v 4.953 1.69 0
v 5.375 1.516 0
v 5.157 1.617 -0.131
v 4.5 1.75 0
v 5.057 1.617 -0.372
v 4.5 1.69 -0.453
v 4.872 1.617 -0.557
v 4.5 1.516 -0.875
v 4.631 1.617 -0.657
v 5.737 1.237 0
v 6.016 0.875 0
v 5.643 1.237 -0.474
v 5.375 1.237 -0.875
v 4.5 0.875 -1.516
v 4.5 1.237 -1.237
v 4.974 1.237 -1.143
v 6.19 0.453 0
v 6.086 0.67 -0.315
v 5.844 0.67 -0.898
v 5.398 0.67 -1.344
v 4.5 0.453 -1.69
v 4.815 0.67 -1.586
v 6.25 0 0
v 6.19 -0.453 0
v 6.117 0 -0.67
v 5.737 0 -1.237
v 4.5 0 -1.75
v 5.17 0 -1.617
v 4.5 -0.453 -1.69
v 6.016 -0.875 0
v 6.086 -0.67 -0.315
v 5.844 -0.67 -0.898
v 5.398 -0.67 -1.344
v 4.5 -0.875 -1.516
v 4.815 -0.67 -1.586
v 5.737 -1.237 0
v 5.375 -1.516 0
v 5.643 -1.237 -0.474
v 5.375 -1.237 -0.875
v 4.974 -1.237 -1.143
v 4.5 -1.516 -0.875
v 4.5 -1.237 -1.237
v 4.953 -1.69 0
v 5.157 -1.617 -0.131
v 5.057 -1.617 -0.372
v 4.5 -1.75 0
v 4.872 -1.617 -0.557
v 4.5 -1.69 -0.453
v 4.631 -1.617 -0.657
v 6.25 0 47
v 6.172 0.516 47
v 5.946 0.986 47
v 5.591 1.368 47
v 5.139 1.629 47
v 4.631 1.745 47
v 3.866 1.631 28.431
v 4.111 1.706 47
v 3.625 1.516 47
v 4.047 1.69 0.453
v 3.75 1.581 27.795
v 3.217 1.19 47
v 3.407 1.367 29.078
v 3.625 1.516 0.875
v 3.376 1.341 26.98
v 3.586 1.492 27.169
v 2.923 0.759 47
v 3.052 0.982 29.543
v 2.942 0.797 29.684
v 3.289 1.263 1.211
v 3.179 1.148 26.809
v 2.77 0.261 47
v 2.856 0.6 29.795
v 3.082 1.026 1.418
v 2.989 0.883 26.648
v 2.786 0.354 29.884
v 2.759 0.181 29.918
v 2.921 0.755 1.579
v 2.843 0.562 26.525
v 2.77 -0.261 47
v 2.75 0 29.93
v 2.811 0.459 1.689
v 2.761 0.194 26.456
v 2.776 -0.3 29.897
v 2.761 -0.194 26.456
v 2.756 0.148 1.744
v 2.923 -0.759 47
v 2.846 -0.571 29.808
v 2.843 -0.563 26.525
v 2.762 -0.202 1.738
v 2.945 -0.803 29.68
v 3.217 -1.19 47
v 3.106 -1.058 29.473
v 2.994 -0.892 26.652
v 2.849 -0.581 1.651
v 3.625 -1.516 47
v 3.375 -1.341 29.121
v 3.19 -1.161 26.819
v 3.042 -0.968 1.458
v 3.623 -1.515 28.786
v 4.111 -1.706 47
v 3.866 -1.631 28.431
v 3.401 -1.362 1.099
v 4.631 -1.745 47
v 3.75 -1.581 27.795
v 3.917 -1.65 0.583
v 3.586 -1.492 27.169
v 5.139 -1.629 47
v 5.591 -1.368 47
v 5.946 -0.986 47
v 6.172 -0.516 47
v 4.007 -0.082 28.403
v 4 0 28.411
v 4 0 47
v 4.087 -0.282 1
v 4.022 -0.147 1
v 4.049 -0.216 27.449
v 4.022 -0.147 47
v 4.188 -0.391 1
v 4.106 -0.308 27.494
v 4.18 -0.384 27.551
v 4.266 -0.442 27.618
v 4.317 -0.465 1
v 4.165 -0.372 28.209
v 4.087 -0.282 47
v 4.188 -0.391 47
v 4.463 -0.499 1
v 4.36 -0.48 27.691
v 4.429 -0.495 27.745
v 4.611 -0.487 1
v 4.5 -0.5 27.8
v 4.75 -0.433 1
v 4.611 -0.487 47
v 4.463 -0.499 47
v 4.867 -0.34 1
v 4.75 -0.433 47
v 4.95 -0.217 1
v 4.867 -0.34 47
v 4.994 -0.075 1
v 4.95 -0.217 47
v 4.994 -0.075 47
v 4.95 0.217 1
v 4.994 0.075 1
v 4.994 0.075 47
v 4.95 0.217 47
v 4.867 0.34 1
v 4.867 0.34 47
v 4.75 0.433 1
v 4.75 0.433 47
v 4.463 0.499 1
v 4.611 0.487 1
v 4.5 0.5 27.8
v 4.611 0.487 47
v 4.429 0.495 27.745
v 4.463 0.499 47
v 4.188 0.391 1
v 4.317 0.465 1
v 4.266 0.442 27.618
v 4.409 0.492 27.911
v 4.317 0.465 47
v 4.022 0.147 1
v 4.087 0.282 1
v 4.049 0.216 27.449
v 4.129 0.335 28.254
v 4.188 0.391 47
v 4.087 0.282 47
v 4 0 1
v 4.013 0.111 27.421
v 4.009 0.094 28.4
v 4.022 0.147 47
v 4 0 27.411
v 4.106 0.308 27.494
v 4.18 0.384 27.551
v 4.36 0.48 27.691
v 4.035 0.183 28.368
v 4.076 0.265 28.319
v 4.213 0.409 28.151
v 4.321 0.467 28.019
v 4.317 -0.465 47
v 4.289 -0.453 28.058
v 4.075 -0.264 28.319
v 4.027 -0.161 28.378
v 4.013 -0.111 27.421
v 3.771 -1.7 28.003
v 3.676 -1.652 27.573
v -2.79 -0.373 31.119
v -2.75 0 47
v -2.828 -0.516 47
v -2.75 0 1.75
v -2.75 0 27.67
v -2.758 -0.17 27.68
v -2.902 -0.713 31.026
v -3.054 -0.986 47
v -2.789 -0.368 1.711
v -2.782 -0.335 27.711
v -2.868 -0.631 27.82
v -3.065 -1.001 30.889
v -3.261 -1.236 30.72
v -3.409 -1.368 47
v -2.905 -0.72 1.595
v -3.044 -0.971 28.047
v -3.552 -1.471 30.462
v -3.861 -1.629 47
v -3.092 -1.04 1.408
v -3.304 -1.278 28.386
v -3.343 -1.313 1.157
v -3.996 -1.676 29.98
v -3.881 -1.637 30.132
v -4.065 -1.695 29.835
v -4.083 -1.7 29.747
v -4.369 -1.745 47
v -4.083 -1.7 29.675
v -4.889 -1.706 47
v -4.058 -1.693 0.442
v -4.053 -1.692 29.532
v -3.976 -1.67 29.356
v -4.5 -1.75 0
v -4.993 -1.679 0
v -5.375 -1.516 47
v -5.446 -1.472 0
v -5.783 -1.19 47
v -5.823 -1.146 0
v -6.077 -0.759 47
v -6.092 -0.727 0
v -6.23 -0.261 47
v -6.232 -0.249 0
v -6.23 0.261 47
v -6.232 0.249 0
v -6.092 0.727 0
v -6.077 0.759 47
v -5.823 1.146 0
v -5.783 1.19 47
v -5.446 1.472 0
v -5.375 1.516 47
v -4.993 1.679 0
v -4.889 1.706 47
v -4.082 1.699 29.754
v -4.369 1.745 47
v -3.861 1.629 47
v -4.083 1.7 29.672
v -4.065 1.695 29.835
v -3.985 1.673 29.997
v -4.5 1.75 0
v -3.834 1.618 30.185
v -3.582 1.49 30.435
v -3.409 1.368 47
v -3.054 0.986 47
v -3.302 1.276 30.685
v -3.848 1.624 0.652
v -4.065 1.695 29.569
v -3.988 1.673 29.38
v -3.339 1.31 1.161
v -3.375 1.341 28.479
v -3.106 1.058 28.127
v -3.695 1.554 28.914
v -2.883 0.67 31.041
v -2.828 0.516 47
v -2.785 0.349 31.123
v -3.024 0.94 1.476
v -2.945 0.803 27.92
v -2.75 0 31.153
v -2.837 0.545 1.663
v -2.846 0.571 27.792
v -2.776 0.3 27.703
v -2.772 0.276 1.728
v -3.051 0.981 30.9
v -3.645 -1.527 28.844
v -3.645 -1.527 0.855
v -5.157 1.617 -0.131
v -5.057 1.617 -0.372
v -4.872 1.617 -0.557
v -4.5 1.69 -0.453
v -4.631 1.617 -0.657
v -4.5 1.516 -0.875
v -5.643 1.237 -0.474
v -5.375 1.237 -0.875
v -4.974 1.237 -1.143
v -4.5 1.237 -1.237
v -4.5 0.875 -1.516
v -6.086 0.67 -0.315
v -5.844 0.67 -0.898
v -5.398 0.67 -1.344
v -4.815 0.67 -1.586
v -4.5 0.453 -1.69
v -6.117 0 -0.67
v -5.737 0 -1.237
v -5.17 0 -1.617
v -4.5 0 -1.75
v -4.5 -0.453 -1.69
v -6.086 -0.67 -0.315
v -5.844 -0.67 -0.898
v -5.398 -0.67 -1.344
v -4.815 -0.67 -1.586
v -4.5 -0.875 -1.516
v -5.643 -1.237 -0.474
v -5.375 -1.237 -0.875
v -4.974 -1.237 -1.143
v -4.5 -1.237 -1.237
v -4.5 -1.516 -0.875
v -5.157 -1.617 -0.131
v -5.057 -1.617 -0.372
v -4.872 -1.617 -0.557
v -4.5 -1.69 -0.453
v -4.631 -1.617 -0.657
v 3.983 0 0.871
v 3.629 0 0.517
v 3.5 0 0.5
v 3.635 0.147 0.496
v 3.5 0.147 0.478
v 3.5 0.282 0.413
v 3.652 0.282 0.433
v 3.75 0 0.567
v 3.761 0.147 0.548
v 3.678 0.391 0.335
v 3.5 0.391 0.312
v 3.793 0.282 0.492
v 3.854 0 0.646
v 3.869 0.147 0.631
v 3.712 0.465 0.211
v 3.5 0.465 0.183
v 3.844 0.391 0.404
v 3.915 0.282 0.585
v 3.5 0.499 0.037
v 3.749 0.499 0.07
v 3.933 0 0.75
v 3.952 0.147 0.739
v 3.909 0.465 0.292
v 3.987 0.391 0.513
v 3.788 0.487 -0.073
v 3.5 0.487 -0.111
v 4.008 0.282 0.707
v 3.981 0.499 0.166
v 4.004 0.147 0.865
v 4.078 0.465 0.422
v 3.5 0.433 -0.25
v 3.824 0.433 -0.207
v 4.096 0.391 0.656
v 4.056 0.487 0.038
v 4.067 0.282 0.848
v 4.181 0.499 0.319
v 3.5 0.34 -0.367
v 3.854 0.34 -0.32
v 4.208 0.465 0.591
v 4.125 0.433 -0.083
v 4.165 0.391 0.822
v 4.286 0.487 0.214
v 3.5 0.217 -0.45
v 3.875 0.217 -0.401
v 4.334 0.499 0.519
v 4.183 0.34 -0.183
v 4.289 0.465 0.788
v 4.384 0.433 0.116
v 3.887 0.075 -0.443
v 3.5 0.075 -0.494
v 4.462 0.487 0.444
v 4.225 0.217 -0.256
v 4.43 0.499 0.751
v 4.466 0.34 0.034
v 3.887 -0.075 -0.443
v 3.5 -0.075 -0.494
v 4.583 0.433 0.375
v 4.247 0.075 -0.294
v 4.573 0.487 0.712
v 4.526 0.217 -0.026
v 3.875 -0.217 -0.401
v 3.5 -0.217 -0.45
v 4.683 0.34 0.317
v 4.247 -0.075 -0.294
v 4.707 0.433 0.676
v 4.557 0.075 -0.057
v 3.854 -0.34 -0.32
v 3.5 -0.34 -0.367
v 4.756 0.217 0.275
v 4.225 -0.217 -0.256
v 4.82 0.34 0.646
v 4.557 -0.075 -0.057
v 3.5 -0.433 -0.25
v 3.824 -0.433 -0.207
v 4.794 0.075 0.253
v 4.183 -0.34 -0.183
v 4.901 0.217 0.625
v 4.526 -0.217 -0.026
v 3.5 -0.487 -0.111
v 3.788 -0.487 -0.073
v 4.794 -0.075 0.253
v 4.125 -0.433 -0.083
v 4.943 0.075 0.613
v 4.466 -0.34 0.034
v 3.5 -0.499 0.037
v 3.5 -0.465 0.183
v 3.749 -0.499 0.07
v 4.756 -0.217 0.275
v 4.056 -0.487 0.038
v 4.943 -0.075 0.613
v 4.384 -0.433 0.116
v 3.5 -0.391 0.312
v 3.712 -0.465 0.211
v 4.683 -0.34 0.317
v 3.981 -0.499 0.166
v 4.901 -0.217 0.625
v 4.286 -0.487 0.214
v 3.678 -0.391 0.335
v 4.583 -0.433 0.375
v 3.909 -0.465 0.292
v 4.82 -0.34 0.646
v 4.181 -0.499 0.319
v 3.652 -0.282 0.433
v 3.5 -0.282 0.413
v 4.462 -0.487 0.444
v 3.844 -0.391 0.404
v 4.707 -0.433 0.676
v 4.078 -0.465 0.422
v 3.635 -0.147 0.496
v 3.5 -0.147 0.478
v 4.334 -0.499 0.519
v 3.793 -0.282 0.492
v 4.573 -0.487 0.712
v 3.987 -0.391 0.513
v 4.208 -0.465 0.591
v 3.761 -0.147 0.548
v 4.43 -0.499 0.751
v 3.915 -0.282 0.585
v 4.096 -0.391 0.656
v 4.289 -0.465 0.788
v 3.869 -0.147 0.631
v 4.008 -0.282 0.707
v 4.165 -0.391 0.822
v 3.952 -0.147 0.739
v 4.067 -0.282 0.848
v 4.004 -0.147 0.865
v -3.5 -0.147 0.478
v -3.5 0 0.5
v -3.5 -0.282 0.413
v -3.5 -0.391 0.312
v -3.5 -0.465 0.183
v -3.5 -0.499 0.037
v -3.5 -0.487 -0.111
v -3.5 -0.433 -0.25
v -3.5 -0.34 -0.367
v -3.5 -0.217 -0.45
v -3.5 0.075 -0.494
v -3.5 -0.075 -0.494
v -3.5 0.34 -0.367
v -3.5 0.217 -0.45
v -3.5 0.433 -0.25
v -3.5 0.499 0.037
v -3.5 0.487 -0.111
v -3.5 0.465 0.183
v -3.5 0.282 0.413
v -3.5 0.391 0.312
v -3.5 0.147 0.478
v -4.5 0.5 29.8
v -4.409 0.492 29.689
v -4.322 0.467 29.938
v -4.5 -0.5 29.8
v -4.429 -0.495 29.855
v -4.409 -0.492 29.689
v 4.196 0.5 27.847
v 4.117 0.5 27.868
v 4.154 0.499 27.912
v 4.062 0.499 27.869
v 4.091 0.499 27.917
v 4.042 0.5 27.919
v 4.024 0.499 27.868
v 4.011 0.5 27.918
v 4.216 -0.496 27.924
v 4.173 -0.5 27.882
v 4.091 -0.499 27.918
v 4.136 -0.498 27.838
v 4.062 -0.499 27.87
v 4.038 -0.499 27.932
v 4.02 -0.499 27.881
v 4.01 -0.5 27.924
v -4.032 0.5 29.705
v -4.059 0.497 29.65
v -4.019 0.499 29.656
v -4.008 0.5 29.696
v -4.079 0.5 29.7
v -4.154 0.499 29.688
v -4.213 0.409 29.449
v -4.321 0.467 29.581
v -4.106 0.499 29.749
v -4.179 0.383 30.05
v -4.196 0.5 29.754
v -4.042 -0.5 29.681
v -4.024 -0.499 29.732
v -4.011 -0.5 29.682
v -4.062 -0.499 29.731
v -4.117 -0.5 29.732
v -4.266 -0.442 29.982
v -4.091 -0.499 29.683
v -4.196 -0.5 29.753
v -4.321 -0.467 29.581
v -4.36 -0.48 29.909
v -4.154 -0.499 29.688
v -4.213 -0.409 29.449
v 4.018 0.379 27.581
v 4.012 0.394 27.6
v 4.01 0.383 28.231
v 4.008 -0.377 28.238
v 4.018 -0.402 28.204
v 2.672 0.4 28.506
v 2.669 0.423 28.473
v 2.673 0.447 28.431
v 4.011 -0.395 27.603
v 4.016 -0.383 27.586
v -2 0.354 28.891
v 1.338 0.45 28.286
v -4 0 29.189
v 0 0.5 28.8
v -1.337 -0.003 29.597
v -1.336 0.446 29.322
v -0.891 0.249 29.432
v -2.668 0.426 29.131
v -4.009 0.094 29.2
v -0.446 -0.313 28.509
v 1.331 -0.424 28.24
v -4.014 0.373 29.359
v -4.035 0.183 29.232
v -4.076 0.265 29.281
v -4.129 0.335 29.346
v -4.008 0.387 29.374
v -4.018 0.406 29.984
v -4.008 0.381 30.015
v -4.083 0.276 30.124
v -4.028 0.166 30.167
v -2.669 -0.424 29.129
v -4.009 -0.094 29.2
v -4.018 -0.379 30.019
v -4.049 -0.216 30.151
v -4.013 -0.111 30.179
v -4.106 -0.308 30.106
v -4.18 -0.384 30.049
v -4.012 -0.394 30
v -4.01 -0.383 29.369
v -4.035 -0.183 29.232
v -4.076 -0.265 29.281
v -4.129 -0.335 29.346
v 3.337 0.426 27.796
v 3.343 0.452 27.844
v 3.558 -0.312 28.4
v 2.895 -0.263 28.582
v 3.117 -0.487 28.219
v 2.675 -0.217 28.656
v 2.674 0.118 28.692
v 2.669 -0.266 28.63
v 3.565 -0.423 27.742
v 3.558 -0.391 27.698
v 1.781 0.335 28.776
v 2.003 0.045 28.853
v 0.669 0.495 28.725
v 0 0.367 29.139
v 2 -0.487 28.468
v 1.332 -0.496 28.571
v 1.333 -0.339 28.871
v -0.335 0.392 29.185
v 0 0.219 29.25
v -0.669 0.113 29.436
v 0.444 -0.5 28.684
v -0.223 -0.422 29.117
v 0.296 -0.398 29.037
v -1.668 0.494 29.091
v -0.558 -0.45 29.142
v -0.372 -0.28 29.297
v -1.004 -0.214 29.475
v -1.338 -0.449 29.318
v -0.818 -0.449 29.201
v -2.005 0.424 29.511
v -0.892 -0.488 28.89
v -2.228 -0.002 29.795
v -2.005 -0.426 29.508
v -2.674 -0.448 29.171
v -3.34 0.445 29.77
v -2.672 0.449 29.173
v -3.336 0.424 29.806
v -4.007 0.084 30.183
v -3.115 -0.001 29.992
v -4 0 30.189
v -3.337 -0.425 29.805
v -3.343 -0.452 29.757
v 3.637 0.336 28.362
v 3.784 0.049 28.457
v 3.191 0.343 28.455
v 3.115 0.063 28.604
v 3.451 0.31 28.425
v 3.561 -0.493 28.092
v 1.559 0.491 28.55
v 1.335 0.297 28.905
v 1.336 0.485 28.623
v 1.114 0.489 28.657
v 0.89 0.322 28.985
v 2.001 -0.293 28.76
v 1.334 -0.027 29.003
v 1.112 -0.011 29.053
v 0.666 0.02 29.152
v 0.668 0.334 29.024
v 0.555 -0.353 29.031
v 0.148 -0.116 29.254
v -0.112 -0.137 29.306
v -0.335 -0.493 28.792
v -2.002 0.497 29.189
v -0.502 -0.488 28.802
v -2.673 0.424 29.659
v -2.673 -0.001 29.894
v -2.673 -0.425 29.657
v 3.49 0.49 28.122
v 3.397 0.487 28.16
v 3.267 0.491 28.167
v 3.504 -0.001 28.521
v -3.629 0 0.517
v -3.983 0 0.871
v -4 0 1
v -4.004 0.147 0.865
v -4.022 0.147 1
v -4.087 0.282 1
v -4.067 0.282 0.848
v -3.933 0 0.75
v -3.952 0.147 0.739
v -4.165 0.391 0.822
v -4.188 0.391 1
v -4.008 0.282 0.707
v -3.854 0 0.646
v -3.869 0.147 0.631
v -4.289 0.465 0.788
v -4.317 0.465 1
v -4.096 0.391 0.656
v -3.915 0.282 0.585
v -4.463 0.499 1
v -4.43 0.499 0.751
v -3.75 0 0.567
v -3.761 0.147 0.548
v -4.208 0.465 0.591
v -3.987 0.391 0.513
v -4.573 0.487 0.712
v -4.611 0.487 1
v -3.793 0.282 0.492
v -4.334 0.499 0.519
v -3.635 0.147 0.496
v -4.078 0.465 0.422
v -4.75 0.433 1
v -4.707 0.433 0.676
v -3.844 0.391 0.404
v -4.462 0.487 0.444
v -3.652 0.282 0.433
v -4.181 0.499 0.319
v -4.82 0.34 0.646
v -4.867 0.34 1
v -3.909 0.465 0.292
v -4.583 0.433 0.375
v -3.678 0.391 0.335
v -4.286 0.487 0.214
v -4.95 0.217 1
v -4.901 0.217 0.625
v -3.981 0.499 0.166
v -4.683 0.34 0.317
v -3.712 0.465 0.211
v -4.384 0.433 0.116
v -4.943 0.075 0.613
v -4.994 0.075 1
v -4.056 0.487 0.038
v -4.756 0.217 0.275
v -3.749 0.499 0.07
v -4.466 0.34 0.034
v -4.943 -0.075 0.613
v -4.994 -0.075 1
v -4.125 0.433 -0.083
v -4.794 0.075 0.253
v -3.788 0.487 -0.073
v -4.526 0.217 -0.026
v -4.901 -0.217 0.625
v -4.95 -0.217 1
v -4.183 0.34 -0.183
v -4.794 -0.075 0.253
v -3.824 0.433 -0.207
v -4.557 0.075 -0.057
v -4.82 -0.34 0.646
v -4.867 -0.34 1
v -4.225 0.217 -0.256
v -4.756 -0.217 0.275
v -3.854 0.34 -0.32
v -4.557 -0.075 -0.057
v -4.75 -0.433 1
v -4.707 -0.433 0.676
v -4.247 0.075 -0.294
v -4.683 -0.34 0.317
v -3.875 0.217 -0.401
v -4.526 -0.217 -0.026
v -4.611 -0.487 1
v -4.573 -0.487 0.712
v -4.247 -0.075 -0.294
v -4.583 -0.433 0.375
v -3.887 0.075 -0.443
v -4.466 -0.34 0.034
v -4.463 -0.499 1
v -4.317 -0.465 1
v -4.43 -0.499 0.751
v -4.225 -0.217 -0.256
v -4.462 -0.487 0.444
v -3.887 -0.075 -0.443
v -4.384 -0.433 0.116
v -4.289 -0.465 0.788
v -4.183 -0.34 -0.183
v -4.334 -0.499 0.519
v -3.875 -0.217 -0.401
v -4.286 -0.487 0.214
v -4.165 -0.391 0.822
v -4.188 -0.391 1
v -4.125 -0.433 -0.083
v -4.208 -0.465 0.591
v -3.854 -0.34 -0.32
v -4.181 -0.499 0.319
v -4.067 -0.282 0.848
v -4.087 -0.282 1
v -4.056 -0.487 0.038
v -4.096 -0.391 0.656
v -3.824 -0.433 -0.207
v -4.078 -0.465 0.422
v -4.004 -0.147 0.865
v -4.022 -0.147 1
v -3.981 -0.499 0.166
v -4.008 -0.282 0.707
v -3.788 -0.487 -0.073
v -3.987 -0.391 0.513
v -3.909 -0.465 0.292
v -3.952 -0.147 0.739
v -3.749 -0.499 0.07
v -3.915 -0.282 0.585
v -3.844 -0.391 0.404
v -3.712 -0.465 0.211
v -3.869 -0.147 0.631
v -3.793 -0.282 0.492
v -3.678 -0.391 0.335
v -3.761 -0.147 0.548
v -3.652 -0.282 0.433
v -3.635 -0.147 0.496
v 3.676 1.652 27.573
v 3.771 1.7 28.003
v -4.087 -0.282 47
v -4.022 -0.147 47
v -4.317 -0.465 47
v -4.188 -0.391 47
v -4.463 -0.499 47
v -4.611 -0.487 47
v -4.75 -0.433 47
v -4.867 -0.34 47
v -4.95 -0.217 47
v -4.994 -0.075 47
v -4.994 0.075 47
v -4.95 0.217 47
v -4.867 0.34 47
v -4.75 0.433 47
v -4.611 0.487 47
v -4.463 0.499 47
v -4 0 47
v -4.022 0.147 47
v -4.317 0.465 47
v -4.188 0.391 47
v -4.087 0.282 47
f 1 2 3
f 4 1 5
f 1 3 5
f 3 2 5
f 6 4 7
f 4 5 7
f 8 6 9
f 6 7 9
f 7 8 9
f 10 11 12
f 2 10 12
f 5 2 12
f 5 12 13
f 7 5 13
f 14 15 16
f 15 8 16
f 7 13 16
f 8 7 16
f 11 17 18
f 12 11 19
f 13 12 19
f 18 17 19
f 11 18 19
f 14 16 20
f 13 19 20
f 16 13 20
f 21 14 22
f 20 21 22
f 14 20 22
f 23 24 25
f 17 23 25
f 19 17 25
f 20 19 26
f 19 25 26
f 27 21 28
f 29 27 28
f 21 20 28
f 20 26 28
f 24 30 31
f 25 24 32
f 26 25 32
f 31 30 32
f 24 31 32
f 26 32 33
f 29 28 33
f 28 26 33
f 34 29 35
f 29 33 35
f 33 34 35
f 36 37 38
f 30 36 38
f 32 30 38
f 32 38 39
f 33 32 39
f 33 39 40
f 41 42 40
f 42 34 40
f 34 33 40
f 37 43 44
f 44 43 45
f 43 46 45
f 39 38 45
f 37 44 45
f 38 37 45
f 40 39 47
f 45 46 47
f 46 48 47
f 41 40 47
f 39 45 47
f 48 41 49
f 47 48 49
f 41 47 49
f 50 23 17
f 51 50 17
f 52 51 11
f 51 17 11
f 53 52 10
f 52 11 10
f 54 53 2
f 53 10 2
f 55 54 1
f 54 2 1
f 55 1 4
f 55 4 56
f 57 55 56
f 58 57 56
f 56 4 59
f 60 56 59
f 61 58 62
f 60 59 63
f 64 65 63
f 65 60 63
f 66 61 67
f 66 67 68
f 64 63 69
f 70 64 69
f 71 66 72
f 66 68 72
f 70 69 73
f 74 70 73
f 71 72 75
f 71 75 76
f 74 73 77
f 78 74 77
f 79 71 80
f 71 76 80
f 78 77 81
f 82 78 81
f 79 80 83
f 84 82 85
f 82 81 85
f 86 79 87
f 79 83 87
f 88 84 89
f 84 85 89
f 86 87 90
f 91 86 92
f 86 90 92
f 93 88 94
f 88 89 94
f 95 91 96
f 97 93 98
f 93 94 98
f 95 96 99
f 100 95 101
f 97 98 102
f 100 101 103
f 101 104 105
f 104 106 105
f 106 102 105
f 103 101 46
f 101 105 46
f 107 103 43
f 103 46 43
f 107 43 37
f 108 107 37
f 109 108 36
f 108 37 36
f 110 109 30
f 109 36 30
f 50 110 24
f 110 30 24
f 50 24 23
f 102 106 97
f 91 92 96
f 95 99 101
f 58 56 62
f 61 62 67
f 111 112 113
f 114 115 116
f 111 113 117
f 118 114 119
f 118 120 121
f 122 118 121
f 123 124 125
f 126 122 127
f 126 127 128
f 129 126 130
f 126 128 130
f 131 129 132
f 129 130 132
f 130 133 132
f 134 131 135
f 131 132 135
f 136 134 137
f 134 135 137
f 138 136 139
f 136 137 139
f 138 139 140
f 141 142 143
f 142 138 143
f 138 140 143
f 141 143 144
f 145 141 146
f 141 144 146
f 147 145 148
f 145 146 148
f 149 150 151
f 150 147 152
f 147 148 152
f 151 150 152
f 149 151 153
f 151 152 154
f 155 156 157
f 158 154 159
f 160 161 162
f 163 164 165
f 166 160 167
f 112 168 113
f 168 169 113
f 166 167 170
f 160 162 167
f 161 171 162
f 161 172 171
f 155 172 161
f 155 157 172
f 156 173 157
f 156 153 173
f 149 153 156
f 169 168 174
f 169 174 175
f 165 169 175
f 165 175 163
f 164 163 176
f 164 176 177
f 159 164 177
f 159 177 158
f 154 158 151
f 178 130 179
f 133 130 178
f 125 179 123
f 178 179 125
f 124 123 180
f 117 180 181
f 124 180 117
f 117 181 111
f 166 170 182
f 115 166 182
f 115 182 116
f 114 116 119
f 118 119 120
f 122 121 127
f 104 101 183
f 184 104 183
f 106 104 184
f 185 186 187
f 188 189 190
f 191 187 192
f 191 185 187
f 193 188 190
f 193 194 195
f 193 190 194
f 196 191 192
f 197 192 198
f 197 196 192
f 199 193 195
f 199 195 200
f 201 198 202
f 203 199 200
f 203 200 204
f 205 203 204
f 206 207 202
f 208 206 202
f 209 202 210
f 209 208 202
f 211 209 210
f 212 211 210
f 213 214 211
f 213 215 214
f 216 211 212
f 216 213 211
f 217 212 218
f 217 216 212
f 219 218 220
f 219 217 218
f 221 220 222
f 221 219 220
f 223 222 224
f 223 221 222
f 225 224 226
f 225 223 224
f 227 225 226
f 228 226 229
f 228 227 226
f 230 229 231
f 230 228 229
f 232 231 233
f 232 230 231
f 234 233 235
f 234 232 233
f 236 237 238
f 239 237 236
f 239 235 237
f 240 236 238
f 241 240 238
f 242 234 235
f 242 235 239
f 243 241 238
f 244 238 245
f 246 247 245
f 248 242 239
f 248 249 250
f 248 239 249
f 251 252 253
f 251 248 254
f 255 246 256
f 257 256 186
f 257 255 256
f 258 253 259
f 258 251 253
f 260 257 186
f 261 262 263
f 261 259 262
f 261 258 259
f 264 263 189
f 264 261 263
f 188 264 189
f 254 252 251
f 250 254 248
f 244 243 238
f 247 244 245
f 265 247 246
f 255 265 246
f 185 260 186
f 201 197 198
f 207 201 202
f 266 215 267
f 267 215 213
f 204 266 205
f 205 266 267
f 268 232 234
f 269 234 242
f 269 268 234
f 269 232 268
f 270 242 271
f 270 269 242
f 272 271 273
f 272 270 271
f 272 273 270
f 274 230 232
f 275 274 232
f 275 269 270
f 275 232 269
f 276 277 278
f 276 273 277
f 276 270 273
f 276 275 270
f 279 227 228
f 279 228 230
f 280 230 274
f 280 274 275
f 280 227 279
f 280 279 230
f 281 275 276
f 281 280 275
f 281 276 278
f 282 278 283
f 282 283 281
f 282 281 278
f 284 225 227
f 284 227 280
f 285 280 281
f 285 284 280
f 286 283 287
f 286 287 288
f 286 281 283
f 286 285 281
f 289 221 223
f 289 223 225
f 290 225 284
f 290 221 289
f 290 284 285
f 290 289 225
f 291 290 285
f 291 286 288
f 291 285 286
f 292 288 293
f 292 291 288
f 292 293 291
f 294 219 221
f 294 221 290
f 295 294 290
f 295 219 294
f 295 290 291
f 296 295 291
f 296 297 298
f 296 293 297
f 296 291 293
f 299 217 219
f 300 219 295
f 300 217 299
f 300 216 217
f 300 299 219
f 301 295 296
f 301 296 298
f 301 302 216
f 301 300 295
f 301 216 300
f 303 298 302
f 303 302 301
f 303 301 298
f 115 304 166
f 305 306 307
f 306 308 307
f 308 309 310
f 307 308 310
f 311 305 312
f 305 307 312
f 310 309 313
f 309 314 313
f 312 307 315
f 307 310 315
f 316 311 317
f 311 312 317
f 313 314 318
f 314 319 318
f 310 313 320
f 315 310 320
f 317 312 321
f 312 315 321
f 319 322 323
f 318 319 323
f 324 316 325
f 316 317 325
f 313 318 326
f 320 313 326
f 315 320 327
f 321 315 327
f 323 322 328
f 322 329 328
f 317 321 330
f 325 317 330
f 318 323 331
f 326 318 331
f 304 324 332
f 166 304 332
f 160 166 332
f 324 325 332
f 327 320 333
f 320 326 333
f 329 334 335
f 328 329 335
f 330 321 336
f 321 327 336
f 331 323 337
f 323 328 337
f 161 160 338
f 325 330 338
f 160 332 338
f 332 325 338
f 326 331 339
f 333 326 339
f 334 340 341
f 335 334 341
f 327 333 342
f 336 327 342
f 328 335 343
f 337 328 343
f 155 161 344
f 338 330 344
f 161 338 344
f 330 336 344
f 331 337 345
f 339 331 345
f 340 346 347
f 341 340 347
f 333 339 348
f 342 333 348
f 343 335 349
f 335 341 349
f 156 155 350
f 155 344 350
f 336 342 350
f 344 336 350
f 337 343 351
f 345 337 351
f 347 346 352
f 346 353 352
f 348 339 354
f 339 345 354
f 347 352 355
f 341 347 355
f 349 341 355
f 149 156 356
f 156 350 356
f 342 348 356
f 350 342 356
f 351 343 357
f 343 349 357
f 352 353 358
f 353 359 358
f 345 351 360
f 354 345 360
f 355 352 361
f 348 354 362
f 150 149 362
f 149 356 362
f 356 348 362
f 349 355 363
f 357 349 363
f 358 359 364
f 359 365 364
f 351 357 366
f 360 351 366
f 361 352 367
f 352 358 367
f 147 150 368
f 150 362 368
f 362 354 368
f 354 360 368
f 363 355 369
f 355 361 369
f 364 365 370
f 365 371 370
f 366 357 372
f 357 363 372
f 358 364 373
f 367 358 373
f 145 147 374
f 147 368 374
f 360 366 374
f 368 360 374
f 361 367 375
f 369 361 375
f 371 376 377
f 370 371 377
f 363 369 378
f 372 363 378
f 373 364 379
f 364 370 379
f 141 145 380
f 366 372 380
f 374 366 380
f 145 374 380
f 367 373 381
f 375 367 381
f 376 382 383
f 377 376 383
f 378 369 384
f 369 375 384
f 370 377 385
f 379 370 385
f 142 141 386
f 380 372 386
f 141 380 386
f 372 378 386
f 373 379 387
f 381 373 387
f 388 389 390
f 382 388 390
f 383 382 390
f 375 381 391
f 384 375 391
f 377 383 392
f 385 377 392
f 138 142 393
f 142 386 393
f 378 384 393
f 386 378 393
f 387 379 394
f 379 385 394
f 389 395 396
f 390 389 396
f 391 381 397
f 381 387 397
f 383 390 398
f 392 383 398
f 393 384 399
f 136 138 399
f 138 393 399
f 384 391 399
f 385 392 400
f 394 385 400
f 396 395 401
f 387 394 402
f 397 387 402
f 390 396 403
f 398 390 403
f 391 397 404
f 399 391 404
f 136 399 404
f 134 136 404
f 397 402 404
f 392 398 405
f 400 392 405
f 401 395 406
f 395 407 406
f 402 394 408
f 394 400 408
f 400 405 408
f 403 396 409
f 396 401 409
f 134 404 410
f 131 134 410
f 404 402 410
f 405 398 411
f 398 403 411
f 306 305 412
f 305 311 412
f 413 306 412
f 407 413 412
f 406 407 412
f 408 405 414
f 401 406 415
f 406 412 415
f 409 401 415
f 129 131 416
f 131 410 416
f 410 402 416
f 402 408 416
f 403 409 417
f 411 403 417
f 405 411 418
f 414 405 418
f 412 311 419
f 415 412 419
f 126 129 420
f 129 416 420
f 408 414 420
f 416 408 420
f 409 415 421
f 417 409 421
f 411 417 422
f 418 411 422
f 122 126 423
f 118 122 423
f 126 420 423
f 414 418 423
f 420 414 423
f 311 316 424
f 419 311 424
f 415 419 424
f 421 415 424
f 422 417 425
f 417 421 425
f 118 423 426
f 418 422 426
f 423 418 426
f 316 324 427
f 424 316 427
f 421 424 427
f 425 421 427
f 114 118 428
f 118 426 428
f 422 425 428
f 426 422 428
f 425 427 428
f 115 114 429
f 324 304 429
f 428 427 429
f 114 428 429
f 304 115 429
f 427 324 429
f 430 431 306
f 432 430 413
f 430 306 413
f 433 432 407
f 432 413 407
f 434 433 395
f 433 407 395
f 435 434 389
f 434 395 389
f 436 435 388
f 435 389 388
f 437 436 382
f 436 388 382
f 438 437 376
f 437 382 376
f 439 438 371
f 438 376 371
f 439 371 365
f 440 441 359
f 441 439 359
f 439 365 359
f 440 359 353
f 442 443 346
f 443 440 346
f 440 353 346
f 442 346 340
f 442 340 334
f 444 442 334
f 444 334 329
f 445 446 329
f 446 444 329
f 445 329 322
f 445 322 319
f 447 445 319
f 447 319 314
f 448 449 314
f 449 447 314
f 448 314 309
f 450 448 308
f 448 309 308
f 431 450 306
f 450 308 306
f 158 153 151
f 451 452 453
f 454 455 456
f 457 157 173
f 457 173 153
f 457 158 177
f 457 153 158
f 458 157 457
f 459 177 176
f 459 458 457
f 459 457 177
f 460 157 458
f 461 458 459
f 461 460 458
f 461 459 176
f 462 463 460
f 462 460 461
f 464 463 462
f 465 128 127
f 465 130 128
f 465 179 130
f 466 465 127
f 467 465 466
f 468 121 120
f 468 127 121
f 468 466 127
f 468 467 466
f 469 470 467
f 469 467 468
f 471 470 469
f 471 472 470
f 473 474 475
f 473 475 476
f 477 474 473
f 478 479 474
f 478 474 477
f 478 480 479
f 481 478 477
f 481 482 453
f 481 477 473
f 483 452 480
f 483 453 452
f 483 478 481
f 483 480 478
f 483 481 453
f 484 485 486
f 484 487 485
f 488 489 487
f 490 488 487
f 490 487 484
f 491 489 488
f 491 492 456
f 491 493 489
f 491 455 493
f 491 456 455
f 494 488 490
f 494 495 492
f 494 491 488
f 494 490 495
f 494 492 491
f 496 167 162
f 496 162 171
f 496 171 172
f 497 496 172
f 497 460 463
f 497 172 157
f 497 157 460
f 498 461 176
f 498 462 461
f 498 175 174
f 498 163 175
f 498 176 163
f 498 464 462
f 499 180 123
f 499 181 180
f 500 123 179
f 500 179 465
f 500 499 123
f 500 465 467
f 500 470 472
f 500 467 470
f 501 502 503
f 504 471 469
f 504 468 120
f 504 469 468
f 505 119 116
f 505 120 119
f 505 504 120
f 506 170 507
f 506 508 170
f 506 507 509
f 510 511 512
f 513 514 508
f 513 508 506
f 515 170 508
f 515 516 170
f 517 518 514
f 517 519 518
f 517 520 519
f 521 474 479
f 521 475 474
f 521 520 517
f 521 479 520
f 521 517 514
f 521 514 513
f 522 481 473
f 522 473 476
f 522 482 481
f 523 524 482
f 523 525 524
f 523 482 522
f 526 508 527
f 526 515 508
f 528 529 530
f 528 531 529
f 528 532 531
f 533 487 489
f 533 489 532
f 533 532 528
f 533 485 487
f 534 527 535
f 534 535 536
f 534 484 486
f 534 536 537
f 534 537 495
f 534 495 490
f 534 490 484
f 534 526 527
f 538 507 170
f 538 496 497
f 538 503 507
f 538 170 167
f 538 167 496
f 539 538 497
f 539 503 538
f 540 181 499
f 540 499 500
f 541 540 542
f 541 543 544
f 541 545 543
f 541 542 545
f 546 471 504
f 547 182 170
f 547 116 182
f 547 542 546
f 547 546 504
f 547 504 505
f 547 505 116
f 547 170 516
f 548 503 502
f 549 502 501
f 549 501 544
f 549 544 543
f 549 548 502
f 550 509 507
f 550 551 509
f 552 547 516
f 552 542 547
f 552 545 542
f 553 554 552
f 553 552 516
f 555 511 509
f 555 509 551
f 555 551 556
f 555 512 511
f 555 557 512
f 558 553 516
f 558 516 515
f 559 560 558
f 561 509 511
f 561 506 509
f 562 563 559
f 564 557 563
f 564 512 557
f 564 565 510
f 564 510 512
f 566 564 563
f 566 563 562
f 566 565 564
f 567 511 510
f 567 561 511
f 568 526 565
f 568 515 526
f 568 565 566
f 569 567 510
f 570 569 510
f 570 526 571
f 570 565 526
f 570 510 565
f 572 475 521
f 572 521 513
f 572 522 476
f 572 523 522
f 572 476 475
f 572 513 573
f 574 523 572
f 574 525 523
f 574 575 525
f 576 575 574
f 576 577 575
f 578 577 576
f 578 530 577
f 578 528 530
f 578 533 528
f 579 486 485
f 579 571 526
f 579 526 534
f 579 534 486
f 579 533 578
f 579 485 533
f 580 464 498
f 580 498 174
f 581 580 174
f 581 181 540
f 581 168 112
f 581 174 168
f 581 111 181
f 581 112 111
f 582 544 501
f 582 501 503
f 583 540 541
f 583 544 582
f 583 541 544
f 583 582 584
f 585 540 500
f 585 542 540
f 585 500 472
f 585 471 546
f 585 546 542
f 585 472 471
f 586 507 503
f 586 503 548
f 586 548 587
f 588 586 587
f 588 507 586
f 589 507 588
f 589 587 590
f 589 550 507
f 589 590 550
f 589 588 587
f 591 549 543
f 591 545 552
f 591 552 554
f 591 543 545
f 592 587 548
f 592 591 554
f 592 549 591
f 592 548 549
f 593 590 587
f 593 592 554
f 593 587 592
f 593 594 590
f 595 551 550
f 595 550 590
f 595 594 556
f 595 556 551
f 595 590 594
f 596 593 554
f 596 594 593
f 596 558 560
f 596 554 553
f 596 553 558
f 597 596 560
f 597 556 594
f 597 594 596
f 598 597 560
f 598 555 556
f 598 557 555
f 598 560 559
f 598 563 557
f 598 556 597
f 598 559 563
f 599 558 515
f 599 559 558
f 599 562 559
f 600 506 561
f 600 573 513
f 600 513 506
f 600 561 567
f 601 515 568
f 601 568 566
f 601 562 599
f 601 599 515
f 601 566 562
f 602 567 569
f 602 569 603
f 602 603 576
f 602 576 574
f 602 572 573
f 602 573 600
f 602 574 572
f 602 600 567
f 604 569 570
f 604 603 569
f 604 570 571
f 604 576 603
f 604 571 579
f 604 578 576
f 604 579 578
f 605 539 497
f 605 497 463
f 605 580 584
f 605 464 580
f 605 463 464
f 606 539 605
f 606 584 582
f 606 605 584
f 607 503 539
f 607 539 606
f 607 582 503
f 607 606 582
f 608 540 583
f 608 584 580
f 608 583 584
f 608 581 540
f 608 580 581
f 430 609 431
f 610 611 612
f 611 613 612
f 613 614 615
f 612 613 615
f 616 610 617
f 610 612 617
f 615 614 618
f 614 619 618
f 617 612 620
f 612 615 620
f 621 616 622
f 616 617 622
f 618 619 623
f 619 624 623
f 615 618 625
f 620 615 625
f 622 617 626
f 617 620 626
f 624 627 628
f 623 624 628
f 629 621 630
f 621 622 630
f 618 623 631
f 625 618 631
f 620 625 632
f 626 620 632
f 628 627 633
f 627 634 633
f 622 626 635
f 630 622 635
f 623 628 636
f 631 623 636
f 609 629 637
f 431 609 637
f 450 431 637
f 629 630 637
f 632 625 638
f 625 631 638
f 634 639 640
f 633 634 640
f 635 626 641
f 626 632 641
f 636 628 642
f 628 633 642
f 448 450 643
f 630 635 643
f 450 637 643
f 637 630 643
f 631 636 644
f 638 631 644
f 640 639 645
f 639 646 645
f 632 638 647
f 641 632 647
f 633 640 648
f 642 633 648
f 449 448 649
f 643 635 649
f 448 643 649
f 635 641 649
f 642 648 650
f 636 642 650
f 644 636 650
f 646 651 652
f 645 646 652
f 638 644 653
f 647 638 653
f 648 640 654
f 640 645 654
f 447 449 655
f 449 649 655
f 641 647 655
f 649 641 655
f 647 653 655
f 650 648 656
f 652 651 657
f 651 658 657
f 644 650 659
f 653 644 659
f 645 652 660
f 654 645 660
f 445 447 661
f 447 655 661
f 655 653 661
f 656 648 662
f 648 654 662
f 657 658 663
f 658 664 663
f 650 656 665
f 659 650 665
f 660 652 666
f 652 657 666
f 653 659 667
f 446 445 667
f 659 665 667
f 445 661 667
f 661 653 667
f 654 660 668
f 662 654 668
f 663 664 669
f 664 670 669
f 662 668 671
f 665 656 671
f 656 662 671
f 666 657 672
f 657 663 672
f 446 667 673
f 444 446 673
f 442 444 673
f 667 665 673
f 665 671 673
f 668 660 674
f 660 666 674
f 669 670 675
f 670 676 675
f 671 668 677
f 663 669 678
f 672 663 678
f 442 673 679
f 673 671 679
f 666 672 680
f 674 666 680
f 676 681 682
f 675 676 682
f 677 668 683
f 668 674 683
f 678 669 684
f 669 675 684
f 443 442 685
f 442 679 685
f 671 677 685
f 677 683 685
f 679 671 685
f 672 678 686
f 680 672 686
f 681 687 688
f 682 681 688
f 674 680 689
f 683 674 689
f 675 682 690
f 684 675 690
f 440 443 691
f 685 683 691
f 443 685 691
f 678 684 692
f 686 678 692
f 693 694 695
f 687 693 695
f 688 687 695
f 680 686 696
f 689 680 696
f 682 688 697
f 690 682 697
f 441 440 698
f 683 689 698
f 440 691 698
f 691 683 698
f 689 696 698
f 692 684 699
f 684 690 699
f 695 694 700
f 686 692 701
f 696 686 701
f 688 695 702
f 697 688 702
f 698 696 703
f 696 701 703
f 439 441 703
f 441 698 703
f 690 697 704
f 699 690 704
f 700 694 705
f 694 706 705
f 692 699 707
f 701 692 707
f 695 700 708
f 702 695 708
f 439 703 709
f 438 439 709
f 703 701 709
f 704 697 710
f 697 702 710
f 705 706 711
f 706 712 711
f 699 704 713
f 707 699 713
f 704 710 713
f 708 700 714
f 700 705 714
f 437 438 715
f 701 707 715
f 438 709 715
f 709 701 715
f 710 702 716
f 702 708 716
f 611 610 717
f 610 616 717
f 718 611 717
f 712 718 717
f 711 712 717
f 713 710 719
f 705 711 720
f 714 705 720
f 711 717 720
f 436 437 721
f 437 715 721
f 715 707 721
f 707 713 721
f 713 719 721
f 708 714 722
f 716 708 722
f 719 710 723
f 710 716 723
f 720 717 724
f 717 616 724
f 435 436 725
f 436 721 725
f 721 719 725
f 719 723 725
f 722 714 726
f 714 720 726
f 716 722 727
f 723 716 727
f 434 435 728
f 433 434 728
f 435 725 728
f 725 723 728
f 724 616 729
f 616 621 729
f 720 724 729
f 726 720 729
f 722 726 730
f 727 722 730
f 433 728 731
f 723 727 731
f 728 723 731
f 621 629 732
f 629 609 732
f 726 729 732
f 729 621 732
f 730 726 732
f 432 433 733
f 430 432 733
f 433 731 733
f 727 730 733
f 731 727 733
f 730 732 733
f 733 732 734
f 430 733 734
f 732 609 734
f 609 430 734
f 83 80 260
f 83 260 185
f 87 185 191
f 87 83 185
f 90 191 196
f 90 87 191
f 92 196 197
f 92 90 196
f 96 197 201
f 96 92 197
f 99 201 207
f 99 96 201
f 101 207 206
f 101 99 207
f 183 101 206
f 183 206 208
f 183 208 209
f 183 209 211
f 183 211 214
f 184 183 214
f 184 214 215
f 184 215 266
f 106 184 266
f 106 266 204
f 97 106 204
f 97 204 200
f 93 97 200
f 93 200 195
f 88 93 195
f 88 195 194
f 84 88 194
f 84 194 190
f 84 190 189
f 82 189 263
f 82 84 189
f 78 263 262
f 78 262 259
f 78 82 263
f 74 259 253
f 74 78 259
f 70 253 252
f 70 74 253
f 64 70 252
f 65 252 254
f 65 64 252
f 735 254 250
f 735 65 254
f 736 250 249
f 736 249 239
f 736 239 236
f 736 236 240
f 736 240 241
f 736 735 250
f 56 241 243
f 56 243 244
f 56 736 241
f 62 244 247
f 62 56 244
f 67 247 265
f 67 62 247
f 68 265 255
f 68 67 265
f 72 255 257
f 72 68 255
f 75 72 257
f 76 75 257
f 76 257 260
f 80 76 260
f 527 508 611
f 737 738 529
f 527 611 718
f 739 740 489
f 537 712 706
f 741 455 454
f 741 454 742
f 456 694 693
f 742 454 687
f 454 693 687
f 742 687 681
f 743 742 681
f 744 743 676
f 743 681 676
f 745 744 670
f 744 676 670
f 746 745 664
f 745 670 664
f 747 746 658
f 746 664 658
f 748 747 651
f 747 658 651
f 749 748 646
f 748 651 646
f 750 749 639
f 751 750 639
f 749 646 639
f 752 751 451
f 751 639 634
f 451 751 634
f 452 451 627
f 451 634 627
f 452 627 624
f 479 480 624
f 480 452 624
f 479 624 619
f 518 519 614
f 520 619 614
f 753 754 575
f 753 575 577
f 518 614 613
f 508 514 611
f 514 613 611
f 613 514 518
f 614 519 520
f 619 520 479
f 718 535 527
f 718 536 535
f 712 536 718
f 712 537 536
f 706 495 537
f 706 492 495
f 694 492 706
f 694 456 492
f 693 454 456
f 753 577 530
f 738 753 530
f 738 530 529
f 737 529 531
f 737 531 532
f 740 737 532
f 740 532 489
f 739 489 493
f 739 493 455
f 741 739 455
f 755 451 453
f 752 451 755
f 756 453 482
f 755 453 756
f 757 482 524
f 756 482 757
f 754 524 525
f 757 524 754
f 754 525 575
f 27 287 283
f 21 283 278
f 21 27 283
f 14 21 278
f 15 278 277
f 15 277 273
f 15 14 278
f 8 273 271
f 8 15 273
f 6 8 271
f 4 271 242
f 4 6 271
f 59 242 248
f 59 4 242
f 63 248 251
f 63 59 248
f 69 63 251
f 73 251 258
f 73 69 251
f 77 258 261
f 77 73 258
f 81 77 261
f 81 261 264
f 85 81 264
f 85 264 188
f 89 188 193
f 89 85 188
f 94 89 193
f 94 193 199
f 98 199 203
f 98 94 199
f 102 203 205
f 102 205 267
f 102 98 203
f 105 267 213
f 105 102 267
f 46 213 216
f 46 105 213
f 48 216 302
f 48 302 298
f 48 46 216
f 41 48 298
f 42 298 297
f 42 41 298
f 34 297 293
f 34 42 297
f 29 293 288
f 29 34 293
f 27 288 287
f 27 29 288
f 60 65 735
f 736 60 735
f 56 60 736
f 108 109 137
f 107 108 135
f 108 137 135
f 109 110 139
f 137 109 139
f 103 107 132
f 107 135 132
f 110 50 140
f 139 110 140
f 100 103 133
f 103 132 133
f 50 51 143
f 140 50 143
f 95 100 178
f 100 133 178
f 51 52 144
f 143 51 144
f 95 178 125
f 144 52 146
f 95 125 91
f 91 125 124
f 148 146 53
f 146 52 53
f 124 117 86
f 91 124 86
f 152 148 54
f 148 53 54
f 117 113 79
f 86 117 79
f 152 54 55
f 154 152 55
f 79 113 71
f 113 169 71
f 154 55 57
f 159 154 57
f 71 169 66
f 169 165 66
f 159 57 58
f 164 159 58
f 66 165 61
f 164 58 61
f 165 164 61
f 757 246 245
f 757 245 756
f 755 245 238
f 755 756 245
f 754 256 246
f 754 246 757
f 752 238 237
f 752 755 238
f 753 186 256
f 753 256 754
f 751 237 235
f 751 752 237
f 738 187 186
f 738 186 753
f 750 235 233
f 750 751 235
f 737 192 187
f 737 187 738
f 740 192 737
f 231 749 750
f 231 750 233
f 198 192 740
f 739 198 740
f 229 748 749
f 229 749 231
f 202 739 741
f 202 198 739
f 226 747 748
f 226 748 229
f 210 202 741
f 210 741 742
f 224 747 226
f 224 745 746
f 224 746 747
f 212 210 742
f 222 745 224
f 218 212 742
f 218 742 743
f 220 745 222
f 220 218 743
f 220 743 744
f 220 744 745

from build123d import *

# Parameters (mm, degrees)
SKETCH_5_W         = 1.75
SKETCH_5_H         = 47
SKETCH_6_W         = 1.75
SKETCH_6_H         = 47
SKETCH_7_W         = 9
SKETCH_7_H         = 1.75
LEFT_ORNER_ANGLE   = 90
RIGHT_CORNER_ANGLE = 90
SKETCH_11_R        = 0.5
SKETCH_13_R        = 0.5


with BuildPart() as part:
    # 草圖5 → left (revolve)
    with BuildSketch(Plane(origin=(0, 0, 0), x_dir=(1, 0, 0), z_dir=(0, 1, 0))):
        with Locations((-3.625, -23.5)):
            Rectangle(SKETCH_5_W, SKETCH_5_H)
    revolve(axis=Axis((-4.5, 0, 47), (0, 0, -1)))



with BuildPart() as body_2:
    # 草圖6 → right (revolve)
    with BuildSketch(Plane(origin=(0, 0, 0), x_dir=(1, 0, 0), z_dir=(0, 1, 0))):
        with Locations((5.375, -23.5)):
            Rectangle(SKETCH_6_W, SKETCH_6_H)
    revolve(axis=Axis((4.5, 0, 0), (0, 0, 1)))


with BuildPart() as part_1:
    add(part.part)

    add(body_2.part)  # down merges body 2
    # 草圖7 → down (revolve)
    with BuildSketch(Plane(origin=(0, 0, 0), x_dir=(1, 0, 0), z_dir=(0, 1, 0))):
        with Locations((0, 0.875)):
            Rectangle(SKETCH_7_W, SKETCH_7_H)
    revolve(axis=Axis((-4.5, 0, 0), (1, 0, 0)))

    # 草圖8 → left_orner (revolve)
    with BuildSketch(Plane(origin=(0, 0, 0), x_dir=(-1, 0, 0), z_dir=(0, 0, -1))):
        with BuildLine():
            Line((4.5, -1.75), (4.5, 1.75))
            ThreePointArc((4.5, 1.75), (6.25, 0), (4.5, -1.75))
        make_face()
    revolve(axis=Axis((-4.5, -1.75, 0), (0, -1, 0)), revolution_arc=LEFT_ORNER_ANGLE)

    # 草圖9 → right_corner (revolve)
    with BuildSketch(Plane(origin=(0, 0, 0), x_dir=(-1, 0, 0), z_dir=(0, 0, -1))):
        with BuildLine():
            Line((-4.5, -1.75), (-4.5, 1.75))
            ThreePointArc((-4.5, 1.75), (-6.25, 0), (-4.5, -1.75))
        make_face()
    revolve(axis=Axis((4.5, -1.75, 0), (0, 1, 0)), revolution_arc=RIGHT_CORNER_ANGLE)

    # 草圖10 → up (revolve)
    with BuildSketch(Plane(origin=(0, 0, 0), x_dir=(1, 0, 0), z_dir=(0, 1, 0))):
        Polygon((-4.131218222, -29.718048494), (-4.131218222, -31.459518002), (4.131218222, -29.623421015), (4.131218222, -27.881951506), align=None)
    revolve(axis=Axis((-4.5, 0, 29.8), (0.97618706, 0, -0.216930458)))

    # inside: sweep along a path in 草圖12
    with BuildLine(Plane(origin=(0, 0, 0), x_dir=(1, 0, 0), z_dir=(0, 1, 0))) as inside_path:
        Line((-4.5, -47), (-4.5, -1))
        ThreePointArc((-4.5, -1), (-4.207106781, -0.292893219), (-3.5, 0))
        Line((-3.5, 0), (3.5, 0))
        ThreePointArc((3.5, 0), (4.207106781, -0.292893219), (4.5, -1))
        Line((4.5, -1), (4.5, -47))
    # 草圖11 → inside (sweep, cut)
    with BuildSketch(Plane.XY.offset(47)):
        with Locations((-4.5, 0)):
            Circle(SKETCH_11_R)
    sweep(path=inside_path.line, mode=Mode.SUBTRACT)

    # up_inside: sweep along a path in 草圖14
    with BuildLine(Plane(origin=(0, 0, 0), x_dir=(1, 0, 0), z_dir=(0, 1, 0))) as up_inside_path:
        Line((4.5, -27.8), (-4.5, -29.8))
    # 草圖13 → up_inside (sweep, cut)
    with BuildSketch(Plane(origin=(4.5, 0, 0), x_dir=(0, 0, -1), z_dir=(1, 0, 0))):
        with Locations((-27.8, 0)):
            Circle(SKETCH_13_R)
    sweep(path=up_inside_path.line, mode=Mode.SUBTRACT)


solid = part_1.part
